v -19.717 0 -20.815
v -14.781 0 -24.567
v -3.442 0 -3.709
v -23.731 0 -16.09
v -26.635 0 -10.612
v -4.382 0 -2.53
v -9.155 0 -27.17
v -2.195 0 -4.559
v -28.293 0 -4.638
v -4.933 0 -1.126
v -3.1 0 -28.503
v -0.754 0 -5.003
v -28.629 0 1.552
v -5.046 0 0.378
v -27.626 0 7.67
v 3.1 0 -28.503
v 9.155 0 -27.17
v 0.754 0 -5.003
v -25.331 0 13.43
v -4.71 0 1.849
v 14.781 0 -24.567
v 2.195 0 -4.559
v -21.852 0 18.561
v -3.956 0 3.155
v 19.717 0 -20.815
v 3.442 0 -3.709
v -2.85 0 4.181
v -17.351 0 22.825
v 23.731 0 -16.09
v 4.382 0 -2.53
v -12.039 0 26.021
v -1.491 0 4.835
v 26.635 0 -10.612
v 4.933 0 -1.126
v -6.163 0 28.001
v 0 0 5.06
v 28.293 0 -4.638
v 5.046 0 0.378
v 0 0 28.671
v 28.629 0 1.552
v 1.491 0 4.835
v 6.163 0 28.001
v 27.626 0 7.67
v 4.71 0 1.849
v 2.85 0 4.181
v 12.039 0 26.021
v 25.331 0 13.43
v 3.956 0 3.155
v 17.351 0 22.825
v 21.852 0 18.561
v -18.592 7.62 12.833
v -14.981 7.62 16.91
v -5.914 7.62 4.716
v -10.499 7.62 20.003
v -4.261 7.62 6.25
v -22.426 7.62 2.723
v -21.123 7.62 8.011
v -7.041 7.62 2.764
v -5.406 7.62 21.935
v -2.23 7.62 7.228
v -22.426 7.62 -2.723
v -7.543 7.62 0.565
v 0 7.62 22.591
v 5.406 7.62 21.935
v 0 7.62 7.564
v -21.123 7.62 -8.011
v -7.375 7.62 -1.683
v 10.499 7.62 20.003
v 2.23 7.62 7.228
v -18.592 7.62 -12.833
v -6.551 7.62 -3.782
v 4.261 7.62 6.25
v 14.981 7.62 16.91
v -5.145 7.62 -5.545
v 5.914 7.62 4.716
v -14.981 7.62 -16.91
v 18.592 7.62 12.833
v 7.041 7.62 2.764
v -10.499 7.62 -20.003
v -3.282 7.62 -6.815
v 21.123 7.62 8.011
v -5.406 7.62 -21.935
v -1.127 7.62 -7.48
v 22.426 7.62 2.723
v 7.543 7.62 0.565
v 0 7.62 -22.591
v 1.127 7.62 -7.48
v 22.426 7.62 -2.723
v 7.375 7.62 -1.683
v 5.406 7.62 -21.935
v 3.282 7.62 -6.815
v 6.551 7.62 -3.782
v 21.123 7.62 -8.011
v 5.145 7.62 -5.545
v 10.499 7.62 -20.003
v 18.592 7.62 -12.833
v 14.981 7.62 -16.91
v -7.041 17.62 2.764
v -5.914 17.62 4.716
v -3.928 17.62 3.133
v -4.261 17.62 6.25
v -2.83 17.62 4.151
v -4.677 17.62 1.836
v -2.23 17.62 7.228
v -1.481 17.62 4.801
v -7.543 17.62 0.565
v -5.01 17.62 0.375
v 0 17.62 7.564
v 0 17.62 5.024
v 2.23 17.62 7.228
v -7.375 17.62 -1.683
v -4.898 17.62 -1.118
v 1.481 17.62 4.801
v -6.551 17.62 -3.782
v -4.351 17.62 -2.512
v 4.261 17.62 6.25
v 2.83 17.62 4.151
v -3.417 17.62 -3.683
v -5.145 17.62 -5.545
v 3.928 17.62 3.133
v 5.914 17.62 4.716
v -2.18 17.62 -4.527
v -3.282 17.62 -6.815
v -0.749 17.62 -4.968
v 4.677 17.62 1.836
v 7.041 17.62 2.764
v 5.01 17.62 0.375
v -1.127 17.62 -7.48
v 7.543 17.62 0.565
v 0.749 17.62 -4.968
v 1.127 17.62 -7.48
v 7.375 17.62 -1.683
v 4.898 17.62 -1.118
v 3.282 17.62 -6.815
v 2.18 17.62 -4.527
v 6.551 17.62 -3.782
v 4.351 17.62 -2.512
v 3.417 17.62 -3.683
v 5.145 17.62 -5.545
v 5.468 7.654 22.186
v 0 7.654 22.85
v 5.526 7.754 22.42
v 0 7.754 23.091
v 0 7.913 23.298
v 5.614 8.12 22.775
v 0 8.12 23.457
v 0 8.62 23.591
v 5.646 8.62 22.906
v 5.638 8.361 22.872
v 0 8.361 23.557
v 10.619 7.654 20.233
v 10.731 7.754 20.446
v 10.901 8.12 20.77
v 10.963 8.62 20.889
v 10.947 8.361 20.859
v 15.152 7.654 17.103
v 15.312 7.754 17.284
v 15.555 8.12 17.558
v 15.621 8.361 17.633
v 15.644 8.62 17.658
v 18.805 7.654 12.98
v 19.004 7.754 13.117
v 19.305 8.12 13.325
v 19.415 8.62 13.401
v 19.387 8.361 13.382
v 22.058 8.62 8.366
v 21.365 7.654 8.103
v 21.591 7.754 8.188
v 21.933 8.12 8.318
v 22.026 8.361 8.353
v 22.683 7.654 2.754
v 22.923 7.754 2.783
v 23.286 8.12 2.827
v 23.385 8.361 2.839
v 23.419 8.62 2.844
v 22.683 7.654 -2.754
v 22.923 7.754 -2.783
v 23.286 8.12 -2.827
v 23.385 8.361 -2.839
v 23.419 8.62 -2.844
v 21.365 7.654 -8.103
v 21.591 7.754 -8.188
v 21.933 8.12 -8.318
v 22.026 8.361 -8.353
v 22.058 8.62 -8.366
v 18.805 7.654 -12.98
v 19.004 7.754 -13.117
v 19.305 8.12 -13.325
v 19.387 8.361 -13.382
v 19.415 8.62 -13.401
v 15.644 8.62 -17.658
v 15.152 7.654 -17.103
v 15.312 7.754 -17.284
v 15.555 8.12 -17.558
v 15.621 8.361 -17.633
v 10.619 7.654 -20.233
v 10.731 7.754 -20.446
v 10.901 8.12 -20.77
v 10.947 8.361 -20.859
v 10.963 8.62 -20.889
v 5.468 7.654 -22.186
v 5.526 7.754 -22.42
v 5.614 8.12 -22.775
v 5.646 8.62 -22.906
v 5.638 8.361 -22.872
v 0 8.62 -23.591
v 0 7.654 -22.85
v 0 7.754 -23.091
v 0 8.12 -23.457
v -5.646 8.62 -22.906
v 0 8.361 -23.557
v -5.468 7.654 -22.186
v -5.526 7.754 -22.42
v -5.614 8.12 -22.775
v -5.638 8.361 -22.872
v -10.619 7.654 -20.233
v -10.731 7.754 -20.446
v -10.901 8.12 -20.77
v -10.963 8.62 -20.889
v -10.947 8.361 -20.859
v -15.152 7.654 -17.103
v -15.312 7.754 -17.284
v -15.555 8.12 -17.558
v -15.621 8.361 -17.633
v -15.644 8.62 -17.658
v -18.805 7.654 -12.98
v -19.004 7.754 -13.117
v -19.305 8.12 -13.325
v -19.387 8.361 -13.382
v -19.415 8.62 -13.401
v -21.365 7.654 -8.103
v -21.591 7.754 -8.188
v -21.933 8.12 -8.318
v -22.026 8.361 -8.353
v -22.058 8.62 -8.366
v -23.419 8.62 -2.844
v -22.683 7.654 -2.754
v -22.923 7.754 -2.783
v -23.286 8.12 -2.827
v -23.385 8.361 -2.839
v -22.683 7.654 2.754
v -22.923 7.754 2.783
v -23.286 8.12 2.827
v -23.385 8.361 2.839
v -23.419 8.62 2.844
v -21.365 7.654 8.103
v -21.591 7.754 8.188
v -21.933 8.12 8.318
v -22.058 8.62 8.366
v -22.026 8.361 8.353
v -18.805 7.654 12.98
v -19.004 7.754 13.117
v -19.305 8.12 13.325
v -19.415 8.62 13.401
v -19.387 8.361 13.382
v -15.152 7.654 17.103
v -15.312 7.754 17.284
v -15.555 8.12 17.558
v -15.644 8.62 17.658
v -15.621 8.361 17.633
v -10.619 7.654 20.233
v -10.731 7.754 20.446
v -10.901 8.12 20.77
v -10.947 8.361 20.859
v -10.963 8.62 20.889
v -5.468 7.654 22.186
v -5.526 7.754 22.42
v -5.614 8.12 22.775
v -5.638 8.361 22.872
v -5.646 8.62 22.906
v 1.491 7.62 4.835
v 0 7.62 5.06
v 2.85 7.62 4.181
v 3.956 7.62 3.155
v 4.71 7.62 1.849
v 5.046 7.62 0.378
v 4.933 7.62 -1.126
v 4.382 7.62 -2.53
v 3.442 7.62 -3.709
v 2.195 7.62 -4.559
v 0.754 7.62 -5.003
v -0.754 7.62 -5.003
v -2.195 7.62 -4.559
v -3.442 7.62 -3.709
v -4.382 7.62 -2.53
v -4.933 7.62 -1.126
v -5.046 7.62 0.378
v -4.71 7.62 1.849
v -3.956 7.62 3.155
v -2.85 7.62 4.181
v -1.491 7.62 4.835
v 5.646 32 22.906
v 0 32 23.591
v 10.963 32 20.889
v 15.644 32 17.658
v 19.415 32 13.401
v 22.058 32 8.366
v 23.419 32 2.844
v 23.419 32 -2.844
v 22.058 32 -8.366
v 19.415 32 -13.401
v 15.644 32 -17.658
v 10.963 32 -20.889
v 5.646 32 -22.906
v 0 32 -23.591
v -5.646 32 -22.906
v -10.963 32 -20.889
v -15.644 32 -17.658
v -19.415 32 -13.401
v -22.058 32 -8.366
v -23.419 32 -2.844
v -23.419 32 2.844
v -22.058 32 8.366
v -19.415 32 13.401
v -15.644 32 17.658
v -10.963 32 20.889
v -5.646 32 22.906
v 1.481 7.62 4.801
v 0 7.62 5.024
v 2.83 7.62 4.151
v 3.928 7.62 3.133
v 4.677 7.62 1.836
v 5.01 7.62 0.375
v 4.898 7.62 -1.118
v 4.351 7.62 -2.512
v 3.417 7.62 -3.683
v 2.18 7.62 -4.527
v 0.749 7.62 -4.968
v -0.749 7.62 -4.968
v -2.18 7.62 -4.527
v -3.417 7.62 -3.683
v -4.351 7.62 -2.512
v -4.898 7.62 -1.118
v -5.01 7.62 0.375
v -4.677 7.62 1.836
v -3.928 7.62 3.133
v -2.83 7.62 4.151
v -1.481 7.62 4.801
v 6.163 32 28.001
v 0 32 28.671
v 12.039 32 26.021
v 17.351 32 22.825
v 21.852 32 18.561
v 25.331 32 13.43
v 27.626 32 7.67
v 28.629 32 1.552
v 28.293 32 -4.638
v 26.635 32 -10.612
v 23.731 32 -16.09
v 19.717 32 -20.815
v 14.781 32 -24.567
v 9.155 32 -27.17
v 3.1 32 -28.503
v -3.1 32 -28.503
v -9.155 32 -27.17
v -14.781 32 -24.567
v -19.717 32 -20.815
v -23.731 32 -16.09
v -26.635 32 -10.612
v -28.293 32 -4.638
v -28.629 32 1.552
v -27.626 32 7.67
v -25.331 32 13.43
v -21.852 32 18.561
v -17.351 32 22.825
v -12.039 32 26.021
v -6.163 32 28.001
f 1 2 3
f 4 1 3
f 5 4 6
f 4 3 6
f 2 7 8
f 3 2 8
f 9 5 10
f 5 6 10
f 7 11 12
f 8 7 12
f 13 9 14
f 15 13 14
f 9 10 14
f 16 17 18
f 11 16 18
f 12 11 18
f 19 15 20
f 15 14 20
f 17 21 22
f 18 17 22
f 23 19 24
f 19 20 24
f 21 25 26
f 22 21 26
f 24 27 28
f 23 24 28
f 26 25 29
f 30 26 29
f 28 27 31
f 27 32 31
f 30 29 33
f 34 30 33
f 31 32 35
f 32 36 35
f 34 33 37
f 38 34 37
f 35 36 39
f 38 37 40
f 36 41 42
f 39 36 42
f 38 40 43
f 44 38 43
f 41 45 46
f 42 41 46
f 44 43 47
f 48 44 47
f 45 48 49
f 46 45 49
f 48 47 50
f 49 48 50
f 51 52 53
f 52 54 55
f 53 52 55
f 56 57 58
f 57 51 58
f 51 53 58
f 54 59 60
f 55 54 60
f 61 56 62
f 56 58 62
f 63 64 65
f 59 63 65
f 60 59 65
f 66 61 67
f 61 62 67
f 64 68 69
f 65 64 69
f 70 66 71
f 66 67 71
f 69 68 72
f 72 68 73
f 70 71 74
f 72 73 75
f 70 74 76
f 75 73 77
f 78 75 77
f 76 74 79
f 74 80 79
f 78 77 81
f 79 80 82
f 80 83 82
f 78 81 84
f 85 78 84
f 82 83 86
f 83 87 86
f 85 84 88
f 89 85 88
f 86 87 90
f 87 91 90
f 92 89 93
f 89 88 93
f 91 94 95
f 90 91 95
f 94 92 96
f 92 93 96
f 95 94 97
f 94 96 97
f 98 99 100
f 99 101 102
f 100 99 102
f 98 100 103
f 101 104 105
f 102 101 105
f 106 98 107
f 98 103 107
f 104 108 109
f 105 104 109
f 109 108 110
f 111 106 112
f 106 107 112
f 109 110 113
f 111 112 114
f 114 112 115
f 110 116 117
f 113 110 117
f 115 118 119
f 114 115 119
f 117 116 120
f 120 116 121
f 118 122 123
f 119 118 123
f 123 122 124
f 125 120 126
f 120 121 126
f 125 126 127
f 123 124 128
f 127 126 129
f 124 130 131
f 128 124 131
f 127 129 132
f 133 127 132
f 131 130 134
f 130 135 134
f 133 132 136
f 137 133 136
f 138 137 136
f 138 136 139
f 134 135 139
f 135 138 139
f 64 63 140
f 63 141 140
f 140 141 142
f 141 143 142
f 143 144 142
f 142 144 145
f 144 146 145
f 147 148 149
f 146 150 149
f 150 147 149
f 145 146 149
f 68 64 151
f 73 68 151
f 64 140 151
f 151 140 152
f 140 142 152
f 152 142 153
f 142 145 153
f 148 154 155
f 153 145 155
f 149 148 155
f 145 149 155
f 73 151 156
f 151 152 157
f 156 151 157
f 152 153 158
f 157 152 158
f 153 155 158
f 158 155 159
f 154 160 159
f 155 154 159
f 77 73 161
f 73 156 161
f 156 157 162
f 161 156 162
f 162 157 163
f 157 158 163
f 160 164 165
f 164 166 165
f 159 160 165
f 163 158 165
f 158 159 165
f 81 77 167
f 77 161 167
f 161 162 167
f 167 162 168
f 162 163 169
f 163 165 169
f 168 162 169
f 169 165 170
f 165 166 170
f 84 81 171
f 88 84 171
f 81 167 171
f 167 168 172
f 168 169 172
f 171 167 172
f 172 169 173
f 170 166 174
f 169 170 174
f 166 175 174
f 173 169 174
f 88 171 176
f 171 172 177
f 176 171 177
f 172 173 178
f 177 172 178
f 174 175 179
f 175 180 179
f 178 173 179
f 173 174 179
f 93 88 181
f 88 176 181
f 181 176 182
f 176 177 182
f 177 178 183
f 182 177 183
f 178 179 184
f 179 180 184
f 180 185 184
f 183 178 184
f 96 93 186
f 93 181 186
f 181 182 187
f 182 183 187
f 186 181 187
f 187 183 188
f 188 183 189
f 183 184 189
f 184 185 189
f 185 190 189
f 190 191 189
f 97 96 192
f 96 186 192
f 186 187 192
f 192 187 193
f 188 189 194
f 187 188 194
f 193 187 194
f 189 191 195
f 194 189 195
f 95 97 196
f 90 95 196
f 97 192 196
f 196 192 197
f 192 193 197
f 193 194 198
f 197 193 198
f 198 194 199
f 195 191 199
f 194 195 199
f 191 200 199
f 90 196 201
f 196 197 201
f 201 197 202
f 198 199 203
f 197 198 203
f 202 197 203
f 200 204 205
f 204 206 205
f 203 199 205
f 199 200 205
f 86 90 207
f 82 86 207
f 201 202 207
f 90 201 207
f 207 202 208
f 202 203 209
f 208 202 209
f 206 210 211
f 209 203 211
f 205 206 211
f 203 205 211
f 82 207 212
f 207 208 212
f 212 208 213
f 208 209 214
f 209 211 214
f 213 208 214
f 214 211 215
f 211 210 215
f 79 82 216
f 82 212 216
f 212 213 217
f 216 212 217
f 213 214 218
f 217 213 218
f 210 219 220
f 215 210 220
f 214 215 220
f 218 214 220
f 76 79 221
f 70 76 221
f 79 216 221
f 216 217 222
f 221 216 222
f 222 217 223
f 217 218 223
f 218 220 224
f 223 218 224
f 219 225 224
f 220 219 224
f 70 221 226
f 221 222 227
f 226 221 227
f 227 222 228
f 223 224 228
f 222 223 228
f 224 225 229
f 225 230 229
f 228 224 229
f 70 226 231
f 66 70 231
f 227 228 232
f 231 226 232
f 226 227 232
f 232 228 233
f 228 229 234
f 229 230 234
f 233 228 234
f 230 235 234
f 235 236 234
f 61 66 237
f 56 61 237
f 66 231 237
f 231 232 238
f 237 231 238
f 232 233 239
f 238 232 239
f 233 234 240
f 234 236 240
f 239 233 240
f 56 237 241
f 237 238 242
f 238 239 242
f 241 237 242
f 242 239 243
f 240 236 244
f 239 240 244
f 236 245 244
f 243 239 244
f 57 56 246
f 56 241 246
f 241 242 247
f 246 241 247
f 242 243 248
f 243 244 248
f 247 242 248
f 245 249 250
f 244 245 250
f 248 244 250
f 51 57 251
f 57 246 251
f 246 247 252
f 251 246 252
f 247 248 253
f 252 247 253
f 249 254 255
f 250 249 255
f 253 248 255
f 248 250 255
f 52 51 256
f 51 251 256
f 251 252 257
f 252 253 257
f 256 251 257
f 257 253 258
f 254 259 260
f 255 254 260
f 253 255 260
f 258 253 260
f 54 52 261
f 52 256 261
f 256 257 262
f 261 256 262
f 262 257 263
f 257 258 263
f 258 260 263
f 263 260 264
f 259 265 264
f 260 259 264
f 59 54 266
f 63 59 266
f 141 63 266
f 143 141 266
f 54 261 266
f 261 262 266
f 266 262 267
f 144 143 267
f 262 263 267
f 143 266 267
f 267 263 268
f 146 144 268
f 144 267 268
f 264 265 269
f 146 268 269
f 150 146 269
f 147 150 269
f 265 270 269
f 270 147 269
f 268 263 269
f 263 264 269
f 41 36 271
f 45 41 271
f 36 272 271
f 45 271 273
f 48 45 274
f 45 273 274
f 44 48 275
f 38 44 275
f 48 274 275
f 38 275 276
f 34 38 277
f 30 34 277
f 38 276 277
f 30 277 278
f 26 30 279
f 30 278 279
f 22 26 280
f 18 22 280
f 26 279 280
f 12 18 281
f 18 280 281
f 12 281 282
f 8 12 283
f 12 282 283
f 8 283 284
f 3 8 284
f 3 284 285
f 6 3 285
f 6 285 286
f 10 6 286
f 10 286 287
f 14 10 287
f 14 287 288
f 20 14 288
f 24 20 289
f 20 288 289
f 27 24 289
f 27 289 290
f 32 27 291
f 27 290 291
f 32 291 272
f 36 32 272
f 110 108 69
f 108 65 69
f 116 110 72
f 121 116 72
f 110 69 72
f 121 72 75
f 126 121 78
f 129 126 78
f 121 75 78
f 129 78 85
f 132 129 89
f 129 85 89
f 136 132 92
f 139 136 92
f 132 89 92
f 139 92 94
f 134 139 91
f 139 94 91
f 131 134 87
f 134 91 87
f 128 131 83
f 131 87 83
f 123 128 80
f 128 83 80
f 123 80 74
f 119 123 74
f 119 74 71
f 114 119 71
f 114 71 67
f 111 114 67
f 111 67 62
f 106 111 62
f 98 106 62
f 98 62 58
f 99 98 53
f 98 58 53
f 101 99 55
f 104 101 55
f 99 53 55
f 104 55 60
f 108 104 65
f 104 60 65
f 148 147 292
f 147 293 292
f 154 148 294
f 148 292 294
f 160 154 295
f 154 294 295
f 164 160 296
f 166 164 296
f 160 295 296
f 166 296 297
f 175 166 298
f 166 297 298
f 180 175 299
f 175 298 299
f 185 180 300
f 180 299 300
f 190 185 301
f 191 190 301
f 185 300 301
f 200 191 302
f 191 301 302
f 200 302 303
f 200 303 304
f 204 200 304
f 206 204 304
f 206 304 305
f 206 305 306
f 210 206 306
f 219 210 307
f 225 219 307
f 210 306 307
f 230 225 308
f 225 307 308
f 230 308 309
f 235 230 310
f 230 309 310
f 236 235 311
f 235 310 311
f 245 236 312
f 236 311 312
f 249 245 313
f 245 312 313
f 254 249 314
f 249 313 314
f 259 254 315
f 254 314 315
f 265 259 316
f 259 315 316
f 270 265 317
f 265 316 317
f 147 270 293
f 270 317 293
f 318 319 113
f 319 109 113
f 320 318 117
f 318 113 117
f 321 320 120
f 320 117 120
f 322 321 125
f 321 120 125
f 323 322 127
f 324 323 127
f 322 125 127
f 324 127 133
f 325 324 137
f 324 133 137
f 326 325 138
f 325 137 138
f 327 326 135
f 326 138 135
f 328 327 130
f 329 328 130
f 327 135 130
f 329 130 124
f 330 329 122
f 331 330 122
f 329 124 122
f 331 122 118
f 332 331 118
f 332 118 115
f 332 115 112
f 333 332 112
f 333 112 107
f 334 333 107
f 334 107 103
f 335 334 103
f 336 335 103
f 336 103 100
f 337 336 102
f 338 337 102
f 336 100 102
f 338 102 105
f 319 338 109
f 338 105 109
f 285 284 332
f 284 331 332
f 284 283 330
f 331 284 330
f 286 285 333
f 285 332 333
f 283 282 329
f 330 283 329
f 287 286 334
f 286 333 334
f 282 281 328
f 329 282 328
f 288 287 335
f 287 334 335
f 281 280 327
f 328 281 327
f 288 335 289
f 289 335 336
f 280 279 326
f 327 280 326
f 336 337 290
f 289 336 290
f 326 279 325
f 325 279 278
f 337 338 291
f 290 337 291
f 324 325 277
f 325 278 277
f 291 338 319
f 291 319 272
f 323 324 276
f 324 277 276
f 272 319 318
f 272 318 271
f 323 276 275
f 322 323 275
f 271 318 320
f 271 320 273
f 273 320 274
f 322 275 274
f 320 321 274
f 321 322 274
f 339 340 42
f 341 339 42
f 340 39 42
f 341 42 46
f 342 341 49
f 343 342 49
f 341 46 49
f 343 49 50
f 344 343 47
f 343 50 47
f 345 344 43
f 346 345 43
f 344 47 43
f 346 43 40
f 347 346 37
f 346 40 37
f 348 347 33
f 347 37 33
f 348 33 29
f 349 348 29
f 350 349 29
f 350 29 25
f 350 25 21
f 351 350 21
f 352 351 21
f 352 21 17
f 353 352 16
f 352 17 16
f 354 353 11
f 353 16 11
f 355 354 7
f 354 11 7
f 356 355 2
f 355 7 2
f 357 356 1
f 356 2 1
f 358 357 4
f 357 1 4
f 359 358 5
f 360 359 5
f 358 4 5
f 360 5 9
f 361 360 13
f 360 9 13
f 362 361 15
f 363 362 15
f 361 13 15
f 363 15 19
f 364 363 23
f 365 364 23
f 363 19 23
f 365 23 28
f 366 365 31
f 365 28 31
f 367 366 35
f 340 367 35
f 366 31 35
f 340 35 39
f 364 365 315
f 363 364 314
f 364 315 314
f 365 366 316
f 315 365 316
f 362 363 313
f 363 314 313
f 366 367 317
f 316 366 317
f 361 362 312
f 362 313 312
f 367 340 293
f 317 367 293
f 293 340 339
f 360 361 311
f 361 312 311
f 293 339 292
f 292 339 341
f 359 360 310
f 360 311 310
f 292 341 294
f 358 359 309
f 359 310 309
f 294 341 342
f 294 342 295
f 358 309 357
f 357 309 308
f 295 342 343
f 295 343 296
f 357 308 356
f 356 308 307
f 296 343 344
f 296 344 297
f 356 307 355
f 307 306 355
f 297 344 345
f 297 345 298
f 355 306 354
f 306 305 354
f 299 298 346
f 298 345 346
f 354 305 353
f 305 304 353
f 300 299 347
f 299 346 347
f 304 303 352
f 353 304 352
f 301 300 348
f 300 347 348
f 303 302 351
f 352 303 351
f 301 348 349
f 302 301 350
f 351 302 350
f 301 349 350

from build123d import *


with BuildPart() as f1:
    # F0 (on Right) → F1 (revolve)
    with BuildSketch(Plane.YZ):
        with BuildLine():
            Line((0, 28.671082), (0, 5.059838))
            Line((0, 5.059838), (7.62, 5.059838))
            Line((7.62, 5.059838), (7.62, 5.024209))
            Line((7.62, 5.024209), (17.62, 5.024209))
            Line((17.62, 5.024209), (17.62, 7.564209))
            Line((17.62, 7.564209), (7.62, 7.564209))
            Line((7.62, 7.564209), (7.62, 22.591082))
            ThreePointArc((7.62, 22.591082), (7.912893, 23.298189), (8.62, 23.591082))
            Line((8.62, 23.591082), (32, 23.591082))
            Line((32, 23.591082), (32, 28.671082))
            Line((32, 28.671082), (0, 28.671082))
        make_face()
    revolve(axis=Axis((0, -0.662774, 0), (0, 1, 0)))


solid = f1.part
